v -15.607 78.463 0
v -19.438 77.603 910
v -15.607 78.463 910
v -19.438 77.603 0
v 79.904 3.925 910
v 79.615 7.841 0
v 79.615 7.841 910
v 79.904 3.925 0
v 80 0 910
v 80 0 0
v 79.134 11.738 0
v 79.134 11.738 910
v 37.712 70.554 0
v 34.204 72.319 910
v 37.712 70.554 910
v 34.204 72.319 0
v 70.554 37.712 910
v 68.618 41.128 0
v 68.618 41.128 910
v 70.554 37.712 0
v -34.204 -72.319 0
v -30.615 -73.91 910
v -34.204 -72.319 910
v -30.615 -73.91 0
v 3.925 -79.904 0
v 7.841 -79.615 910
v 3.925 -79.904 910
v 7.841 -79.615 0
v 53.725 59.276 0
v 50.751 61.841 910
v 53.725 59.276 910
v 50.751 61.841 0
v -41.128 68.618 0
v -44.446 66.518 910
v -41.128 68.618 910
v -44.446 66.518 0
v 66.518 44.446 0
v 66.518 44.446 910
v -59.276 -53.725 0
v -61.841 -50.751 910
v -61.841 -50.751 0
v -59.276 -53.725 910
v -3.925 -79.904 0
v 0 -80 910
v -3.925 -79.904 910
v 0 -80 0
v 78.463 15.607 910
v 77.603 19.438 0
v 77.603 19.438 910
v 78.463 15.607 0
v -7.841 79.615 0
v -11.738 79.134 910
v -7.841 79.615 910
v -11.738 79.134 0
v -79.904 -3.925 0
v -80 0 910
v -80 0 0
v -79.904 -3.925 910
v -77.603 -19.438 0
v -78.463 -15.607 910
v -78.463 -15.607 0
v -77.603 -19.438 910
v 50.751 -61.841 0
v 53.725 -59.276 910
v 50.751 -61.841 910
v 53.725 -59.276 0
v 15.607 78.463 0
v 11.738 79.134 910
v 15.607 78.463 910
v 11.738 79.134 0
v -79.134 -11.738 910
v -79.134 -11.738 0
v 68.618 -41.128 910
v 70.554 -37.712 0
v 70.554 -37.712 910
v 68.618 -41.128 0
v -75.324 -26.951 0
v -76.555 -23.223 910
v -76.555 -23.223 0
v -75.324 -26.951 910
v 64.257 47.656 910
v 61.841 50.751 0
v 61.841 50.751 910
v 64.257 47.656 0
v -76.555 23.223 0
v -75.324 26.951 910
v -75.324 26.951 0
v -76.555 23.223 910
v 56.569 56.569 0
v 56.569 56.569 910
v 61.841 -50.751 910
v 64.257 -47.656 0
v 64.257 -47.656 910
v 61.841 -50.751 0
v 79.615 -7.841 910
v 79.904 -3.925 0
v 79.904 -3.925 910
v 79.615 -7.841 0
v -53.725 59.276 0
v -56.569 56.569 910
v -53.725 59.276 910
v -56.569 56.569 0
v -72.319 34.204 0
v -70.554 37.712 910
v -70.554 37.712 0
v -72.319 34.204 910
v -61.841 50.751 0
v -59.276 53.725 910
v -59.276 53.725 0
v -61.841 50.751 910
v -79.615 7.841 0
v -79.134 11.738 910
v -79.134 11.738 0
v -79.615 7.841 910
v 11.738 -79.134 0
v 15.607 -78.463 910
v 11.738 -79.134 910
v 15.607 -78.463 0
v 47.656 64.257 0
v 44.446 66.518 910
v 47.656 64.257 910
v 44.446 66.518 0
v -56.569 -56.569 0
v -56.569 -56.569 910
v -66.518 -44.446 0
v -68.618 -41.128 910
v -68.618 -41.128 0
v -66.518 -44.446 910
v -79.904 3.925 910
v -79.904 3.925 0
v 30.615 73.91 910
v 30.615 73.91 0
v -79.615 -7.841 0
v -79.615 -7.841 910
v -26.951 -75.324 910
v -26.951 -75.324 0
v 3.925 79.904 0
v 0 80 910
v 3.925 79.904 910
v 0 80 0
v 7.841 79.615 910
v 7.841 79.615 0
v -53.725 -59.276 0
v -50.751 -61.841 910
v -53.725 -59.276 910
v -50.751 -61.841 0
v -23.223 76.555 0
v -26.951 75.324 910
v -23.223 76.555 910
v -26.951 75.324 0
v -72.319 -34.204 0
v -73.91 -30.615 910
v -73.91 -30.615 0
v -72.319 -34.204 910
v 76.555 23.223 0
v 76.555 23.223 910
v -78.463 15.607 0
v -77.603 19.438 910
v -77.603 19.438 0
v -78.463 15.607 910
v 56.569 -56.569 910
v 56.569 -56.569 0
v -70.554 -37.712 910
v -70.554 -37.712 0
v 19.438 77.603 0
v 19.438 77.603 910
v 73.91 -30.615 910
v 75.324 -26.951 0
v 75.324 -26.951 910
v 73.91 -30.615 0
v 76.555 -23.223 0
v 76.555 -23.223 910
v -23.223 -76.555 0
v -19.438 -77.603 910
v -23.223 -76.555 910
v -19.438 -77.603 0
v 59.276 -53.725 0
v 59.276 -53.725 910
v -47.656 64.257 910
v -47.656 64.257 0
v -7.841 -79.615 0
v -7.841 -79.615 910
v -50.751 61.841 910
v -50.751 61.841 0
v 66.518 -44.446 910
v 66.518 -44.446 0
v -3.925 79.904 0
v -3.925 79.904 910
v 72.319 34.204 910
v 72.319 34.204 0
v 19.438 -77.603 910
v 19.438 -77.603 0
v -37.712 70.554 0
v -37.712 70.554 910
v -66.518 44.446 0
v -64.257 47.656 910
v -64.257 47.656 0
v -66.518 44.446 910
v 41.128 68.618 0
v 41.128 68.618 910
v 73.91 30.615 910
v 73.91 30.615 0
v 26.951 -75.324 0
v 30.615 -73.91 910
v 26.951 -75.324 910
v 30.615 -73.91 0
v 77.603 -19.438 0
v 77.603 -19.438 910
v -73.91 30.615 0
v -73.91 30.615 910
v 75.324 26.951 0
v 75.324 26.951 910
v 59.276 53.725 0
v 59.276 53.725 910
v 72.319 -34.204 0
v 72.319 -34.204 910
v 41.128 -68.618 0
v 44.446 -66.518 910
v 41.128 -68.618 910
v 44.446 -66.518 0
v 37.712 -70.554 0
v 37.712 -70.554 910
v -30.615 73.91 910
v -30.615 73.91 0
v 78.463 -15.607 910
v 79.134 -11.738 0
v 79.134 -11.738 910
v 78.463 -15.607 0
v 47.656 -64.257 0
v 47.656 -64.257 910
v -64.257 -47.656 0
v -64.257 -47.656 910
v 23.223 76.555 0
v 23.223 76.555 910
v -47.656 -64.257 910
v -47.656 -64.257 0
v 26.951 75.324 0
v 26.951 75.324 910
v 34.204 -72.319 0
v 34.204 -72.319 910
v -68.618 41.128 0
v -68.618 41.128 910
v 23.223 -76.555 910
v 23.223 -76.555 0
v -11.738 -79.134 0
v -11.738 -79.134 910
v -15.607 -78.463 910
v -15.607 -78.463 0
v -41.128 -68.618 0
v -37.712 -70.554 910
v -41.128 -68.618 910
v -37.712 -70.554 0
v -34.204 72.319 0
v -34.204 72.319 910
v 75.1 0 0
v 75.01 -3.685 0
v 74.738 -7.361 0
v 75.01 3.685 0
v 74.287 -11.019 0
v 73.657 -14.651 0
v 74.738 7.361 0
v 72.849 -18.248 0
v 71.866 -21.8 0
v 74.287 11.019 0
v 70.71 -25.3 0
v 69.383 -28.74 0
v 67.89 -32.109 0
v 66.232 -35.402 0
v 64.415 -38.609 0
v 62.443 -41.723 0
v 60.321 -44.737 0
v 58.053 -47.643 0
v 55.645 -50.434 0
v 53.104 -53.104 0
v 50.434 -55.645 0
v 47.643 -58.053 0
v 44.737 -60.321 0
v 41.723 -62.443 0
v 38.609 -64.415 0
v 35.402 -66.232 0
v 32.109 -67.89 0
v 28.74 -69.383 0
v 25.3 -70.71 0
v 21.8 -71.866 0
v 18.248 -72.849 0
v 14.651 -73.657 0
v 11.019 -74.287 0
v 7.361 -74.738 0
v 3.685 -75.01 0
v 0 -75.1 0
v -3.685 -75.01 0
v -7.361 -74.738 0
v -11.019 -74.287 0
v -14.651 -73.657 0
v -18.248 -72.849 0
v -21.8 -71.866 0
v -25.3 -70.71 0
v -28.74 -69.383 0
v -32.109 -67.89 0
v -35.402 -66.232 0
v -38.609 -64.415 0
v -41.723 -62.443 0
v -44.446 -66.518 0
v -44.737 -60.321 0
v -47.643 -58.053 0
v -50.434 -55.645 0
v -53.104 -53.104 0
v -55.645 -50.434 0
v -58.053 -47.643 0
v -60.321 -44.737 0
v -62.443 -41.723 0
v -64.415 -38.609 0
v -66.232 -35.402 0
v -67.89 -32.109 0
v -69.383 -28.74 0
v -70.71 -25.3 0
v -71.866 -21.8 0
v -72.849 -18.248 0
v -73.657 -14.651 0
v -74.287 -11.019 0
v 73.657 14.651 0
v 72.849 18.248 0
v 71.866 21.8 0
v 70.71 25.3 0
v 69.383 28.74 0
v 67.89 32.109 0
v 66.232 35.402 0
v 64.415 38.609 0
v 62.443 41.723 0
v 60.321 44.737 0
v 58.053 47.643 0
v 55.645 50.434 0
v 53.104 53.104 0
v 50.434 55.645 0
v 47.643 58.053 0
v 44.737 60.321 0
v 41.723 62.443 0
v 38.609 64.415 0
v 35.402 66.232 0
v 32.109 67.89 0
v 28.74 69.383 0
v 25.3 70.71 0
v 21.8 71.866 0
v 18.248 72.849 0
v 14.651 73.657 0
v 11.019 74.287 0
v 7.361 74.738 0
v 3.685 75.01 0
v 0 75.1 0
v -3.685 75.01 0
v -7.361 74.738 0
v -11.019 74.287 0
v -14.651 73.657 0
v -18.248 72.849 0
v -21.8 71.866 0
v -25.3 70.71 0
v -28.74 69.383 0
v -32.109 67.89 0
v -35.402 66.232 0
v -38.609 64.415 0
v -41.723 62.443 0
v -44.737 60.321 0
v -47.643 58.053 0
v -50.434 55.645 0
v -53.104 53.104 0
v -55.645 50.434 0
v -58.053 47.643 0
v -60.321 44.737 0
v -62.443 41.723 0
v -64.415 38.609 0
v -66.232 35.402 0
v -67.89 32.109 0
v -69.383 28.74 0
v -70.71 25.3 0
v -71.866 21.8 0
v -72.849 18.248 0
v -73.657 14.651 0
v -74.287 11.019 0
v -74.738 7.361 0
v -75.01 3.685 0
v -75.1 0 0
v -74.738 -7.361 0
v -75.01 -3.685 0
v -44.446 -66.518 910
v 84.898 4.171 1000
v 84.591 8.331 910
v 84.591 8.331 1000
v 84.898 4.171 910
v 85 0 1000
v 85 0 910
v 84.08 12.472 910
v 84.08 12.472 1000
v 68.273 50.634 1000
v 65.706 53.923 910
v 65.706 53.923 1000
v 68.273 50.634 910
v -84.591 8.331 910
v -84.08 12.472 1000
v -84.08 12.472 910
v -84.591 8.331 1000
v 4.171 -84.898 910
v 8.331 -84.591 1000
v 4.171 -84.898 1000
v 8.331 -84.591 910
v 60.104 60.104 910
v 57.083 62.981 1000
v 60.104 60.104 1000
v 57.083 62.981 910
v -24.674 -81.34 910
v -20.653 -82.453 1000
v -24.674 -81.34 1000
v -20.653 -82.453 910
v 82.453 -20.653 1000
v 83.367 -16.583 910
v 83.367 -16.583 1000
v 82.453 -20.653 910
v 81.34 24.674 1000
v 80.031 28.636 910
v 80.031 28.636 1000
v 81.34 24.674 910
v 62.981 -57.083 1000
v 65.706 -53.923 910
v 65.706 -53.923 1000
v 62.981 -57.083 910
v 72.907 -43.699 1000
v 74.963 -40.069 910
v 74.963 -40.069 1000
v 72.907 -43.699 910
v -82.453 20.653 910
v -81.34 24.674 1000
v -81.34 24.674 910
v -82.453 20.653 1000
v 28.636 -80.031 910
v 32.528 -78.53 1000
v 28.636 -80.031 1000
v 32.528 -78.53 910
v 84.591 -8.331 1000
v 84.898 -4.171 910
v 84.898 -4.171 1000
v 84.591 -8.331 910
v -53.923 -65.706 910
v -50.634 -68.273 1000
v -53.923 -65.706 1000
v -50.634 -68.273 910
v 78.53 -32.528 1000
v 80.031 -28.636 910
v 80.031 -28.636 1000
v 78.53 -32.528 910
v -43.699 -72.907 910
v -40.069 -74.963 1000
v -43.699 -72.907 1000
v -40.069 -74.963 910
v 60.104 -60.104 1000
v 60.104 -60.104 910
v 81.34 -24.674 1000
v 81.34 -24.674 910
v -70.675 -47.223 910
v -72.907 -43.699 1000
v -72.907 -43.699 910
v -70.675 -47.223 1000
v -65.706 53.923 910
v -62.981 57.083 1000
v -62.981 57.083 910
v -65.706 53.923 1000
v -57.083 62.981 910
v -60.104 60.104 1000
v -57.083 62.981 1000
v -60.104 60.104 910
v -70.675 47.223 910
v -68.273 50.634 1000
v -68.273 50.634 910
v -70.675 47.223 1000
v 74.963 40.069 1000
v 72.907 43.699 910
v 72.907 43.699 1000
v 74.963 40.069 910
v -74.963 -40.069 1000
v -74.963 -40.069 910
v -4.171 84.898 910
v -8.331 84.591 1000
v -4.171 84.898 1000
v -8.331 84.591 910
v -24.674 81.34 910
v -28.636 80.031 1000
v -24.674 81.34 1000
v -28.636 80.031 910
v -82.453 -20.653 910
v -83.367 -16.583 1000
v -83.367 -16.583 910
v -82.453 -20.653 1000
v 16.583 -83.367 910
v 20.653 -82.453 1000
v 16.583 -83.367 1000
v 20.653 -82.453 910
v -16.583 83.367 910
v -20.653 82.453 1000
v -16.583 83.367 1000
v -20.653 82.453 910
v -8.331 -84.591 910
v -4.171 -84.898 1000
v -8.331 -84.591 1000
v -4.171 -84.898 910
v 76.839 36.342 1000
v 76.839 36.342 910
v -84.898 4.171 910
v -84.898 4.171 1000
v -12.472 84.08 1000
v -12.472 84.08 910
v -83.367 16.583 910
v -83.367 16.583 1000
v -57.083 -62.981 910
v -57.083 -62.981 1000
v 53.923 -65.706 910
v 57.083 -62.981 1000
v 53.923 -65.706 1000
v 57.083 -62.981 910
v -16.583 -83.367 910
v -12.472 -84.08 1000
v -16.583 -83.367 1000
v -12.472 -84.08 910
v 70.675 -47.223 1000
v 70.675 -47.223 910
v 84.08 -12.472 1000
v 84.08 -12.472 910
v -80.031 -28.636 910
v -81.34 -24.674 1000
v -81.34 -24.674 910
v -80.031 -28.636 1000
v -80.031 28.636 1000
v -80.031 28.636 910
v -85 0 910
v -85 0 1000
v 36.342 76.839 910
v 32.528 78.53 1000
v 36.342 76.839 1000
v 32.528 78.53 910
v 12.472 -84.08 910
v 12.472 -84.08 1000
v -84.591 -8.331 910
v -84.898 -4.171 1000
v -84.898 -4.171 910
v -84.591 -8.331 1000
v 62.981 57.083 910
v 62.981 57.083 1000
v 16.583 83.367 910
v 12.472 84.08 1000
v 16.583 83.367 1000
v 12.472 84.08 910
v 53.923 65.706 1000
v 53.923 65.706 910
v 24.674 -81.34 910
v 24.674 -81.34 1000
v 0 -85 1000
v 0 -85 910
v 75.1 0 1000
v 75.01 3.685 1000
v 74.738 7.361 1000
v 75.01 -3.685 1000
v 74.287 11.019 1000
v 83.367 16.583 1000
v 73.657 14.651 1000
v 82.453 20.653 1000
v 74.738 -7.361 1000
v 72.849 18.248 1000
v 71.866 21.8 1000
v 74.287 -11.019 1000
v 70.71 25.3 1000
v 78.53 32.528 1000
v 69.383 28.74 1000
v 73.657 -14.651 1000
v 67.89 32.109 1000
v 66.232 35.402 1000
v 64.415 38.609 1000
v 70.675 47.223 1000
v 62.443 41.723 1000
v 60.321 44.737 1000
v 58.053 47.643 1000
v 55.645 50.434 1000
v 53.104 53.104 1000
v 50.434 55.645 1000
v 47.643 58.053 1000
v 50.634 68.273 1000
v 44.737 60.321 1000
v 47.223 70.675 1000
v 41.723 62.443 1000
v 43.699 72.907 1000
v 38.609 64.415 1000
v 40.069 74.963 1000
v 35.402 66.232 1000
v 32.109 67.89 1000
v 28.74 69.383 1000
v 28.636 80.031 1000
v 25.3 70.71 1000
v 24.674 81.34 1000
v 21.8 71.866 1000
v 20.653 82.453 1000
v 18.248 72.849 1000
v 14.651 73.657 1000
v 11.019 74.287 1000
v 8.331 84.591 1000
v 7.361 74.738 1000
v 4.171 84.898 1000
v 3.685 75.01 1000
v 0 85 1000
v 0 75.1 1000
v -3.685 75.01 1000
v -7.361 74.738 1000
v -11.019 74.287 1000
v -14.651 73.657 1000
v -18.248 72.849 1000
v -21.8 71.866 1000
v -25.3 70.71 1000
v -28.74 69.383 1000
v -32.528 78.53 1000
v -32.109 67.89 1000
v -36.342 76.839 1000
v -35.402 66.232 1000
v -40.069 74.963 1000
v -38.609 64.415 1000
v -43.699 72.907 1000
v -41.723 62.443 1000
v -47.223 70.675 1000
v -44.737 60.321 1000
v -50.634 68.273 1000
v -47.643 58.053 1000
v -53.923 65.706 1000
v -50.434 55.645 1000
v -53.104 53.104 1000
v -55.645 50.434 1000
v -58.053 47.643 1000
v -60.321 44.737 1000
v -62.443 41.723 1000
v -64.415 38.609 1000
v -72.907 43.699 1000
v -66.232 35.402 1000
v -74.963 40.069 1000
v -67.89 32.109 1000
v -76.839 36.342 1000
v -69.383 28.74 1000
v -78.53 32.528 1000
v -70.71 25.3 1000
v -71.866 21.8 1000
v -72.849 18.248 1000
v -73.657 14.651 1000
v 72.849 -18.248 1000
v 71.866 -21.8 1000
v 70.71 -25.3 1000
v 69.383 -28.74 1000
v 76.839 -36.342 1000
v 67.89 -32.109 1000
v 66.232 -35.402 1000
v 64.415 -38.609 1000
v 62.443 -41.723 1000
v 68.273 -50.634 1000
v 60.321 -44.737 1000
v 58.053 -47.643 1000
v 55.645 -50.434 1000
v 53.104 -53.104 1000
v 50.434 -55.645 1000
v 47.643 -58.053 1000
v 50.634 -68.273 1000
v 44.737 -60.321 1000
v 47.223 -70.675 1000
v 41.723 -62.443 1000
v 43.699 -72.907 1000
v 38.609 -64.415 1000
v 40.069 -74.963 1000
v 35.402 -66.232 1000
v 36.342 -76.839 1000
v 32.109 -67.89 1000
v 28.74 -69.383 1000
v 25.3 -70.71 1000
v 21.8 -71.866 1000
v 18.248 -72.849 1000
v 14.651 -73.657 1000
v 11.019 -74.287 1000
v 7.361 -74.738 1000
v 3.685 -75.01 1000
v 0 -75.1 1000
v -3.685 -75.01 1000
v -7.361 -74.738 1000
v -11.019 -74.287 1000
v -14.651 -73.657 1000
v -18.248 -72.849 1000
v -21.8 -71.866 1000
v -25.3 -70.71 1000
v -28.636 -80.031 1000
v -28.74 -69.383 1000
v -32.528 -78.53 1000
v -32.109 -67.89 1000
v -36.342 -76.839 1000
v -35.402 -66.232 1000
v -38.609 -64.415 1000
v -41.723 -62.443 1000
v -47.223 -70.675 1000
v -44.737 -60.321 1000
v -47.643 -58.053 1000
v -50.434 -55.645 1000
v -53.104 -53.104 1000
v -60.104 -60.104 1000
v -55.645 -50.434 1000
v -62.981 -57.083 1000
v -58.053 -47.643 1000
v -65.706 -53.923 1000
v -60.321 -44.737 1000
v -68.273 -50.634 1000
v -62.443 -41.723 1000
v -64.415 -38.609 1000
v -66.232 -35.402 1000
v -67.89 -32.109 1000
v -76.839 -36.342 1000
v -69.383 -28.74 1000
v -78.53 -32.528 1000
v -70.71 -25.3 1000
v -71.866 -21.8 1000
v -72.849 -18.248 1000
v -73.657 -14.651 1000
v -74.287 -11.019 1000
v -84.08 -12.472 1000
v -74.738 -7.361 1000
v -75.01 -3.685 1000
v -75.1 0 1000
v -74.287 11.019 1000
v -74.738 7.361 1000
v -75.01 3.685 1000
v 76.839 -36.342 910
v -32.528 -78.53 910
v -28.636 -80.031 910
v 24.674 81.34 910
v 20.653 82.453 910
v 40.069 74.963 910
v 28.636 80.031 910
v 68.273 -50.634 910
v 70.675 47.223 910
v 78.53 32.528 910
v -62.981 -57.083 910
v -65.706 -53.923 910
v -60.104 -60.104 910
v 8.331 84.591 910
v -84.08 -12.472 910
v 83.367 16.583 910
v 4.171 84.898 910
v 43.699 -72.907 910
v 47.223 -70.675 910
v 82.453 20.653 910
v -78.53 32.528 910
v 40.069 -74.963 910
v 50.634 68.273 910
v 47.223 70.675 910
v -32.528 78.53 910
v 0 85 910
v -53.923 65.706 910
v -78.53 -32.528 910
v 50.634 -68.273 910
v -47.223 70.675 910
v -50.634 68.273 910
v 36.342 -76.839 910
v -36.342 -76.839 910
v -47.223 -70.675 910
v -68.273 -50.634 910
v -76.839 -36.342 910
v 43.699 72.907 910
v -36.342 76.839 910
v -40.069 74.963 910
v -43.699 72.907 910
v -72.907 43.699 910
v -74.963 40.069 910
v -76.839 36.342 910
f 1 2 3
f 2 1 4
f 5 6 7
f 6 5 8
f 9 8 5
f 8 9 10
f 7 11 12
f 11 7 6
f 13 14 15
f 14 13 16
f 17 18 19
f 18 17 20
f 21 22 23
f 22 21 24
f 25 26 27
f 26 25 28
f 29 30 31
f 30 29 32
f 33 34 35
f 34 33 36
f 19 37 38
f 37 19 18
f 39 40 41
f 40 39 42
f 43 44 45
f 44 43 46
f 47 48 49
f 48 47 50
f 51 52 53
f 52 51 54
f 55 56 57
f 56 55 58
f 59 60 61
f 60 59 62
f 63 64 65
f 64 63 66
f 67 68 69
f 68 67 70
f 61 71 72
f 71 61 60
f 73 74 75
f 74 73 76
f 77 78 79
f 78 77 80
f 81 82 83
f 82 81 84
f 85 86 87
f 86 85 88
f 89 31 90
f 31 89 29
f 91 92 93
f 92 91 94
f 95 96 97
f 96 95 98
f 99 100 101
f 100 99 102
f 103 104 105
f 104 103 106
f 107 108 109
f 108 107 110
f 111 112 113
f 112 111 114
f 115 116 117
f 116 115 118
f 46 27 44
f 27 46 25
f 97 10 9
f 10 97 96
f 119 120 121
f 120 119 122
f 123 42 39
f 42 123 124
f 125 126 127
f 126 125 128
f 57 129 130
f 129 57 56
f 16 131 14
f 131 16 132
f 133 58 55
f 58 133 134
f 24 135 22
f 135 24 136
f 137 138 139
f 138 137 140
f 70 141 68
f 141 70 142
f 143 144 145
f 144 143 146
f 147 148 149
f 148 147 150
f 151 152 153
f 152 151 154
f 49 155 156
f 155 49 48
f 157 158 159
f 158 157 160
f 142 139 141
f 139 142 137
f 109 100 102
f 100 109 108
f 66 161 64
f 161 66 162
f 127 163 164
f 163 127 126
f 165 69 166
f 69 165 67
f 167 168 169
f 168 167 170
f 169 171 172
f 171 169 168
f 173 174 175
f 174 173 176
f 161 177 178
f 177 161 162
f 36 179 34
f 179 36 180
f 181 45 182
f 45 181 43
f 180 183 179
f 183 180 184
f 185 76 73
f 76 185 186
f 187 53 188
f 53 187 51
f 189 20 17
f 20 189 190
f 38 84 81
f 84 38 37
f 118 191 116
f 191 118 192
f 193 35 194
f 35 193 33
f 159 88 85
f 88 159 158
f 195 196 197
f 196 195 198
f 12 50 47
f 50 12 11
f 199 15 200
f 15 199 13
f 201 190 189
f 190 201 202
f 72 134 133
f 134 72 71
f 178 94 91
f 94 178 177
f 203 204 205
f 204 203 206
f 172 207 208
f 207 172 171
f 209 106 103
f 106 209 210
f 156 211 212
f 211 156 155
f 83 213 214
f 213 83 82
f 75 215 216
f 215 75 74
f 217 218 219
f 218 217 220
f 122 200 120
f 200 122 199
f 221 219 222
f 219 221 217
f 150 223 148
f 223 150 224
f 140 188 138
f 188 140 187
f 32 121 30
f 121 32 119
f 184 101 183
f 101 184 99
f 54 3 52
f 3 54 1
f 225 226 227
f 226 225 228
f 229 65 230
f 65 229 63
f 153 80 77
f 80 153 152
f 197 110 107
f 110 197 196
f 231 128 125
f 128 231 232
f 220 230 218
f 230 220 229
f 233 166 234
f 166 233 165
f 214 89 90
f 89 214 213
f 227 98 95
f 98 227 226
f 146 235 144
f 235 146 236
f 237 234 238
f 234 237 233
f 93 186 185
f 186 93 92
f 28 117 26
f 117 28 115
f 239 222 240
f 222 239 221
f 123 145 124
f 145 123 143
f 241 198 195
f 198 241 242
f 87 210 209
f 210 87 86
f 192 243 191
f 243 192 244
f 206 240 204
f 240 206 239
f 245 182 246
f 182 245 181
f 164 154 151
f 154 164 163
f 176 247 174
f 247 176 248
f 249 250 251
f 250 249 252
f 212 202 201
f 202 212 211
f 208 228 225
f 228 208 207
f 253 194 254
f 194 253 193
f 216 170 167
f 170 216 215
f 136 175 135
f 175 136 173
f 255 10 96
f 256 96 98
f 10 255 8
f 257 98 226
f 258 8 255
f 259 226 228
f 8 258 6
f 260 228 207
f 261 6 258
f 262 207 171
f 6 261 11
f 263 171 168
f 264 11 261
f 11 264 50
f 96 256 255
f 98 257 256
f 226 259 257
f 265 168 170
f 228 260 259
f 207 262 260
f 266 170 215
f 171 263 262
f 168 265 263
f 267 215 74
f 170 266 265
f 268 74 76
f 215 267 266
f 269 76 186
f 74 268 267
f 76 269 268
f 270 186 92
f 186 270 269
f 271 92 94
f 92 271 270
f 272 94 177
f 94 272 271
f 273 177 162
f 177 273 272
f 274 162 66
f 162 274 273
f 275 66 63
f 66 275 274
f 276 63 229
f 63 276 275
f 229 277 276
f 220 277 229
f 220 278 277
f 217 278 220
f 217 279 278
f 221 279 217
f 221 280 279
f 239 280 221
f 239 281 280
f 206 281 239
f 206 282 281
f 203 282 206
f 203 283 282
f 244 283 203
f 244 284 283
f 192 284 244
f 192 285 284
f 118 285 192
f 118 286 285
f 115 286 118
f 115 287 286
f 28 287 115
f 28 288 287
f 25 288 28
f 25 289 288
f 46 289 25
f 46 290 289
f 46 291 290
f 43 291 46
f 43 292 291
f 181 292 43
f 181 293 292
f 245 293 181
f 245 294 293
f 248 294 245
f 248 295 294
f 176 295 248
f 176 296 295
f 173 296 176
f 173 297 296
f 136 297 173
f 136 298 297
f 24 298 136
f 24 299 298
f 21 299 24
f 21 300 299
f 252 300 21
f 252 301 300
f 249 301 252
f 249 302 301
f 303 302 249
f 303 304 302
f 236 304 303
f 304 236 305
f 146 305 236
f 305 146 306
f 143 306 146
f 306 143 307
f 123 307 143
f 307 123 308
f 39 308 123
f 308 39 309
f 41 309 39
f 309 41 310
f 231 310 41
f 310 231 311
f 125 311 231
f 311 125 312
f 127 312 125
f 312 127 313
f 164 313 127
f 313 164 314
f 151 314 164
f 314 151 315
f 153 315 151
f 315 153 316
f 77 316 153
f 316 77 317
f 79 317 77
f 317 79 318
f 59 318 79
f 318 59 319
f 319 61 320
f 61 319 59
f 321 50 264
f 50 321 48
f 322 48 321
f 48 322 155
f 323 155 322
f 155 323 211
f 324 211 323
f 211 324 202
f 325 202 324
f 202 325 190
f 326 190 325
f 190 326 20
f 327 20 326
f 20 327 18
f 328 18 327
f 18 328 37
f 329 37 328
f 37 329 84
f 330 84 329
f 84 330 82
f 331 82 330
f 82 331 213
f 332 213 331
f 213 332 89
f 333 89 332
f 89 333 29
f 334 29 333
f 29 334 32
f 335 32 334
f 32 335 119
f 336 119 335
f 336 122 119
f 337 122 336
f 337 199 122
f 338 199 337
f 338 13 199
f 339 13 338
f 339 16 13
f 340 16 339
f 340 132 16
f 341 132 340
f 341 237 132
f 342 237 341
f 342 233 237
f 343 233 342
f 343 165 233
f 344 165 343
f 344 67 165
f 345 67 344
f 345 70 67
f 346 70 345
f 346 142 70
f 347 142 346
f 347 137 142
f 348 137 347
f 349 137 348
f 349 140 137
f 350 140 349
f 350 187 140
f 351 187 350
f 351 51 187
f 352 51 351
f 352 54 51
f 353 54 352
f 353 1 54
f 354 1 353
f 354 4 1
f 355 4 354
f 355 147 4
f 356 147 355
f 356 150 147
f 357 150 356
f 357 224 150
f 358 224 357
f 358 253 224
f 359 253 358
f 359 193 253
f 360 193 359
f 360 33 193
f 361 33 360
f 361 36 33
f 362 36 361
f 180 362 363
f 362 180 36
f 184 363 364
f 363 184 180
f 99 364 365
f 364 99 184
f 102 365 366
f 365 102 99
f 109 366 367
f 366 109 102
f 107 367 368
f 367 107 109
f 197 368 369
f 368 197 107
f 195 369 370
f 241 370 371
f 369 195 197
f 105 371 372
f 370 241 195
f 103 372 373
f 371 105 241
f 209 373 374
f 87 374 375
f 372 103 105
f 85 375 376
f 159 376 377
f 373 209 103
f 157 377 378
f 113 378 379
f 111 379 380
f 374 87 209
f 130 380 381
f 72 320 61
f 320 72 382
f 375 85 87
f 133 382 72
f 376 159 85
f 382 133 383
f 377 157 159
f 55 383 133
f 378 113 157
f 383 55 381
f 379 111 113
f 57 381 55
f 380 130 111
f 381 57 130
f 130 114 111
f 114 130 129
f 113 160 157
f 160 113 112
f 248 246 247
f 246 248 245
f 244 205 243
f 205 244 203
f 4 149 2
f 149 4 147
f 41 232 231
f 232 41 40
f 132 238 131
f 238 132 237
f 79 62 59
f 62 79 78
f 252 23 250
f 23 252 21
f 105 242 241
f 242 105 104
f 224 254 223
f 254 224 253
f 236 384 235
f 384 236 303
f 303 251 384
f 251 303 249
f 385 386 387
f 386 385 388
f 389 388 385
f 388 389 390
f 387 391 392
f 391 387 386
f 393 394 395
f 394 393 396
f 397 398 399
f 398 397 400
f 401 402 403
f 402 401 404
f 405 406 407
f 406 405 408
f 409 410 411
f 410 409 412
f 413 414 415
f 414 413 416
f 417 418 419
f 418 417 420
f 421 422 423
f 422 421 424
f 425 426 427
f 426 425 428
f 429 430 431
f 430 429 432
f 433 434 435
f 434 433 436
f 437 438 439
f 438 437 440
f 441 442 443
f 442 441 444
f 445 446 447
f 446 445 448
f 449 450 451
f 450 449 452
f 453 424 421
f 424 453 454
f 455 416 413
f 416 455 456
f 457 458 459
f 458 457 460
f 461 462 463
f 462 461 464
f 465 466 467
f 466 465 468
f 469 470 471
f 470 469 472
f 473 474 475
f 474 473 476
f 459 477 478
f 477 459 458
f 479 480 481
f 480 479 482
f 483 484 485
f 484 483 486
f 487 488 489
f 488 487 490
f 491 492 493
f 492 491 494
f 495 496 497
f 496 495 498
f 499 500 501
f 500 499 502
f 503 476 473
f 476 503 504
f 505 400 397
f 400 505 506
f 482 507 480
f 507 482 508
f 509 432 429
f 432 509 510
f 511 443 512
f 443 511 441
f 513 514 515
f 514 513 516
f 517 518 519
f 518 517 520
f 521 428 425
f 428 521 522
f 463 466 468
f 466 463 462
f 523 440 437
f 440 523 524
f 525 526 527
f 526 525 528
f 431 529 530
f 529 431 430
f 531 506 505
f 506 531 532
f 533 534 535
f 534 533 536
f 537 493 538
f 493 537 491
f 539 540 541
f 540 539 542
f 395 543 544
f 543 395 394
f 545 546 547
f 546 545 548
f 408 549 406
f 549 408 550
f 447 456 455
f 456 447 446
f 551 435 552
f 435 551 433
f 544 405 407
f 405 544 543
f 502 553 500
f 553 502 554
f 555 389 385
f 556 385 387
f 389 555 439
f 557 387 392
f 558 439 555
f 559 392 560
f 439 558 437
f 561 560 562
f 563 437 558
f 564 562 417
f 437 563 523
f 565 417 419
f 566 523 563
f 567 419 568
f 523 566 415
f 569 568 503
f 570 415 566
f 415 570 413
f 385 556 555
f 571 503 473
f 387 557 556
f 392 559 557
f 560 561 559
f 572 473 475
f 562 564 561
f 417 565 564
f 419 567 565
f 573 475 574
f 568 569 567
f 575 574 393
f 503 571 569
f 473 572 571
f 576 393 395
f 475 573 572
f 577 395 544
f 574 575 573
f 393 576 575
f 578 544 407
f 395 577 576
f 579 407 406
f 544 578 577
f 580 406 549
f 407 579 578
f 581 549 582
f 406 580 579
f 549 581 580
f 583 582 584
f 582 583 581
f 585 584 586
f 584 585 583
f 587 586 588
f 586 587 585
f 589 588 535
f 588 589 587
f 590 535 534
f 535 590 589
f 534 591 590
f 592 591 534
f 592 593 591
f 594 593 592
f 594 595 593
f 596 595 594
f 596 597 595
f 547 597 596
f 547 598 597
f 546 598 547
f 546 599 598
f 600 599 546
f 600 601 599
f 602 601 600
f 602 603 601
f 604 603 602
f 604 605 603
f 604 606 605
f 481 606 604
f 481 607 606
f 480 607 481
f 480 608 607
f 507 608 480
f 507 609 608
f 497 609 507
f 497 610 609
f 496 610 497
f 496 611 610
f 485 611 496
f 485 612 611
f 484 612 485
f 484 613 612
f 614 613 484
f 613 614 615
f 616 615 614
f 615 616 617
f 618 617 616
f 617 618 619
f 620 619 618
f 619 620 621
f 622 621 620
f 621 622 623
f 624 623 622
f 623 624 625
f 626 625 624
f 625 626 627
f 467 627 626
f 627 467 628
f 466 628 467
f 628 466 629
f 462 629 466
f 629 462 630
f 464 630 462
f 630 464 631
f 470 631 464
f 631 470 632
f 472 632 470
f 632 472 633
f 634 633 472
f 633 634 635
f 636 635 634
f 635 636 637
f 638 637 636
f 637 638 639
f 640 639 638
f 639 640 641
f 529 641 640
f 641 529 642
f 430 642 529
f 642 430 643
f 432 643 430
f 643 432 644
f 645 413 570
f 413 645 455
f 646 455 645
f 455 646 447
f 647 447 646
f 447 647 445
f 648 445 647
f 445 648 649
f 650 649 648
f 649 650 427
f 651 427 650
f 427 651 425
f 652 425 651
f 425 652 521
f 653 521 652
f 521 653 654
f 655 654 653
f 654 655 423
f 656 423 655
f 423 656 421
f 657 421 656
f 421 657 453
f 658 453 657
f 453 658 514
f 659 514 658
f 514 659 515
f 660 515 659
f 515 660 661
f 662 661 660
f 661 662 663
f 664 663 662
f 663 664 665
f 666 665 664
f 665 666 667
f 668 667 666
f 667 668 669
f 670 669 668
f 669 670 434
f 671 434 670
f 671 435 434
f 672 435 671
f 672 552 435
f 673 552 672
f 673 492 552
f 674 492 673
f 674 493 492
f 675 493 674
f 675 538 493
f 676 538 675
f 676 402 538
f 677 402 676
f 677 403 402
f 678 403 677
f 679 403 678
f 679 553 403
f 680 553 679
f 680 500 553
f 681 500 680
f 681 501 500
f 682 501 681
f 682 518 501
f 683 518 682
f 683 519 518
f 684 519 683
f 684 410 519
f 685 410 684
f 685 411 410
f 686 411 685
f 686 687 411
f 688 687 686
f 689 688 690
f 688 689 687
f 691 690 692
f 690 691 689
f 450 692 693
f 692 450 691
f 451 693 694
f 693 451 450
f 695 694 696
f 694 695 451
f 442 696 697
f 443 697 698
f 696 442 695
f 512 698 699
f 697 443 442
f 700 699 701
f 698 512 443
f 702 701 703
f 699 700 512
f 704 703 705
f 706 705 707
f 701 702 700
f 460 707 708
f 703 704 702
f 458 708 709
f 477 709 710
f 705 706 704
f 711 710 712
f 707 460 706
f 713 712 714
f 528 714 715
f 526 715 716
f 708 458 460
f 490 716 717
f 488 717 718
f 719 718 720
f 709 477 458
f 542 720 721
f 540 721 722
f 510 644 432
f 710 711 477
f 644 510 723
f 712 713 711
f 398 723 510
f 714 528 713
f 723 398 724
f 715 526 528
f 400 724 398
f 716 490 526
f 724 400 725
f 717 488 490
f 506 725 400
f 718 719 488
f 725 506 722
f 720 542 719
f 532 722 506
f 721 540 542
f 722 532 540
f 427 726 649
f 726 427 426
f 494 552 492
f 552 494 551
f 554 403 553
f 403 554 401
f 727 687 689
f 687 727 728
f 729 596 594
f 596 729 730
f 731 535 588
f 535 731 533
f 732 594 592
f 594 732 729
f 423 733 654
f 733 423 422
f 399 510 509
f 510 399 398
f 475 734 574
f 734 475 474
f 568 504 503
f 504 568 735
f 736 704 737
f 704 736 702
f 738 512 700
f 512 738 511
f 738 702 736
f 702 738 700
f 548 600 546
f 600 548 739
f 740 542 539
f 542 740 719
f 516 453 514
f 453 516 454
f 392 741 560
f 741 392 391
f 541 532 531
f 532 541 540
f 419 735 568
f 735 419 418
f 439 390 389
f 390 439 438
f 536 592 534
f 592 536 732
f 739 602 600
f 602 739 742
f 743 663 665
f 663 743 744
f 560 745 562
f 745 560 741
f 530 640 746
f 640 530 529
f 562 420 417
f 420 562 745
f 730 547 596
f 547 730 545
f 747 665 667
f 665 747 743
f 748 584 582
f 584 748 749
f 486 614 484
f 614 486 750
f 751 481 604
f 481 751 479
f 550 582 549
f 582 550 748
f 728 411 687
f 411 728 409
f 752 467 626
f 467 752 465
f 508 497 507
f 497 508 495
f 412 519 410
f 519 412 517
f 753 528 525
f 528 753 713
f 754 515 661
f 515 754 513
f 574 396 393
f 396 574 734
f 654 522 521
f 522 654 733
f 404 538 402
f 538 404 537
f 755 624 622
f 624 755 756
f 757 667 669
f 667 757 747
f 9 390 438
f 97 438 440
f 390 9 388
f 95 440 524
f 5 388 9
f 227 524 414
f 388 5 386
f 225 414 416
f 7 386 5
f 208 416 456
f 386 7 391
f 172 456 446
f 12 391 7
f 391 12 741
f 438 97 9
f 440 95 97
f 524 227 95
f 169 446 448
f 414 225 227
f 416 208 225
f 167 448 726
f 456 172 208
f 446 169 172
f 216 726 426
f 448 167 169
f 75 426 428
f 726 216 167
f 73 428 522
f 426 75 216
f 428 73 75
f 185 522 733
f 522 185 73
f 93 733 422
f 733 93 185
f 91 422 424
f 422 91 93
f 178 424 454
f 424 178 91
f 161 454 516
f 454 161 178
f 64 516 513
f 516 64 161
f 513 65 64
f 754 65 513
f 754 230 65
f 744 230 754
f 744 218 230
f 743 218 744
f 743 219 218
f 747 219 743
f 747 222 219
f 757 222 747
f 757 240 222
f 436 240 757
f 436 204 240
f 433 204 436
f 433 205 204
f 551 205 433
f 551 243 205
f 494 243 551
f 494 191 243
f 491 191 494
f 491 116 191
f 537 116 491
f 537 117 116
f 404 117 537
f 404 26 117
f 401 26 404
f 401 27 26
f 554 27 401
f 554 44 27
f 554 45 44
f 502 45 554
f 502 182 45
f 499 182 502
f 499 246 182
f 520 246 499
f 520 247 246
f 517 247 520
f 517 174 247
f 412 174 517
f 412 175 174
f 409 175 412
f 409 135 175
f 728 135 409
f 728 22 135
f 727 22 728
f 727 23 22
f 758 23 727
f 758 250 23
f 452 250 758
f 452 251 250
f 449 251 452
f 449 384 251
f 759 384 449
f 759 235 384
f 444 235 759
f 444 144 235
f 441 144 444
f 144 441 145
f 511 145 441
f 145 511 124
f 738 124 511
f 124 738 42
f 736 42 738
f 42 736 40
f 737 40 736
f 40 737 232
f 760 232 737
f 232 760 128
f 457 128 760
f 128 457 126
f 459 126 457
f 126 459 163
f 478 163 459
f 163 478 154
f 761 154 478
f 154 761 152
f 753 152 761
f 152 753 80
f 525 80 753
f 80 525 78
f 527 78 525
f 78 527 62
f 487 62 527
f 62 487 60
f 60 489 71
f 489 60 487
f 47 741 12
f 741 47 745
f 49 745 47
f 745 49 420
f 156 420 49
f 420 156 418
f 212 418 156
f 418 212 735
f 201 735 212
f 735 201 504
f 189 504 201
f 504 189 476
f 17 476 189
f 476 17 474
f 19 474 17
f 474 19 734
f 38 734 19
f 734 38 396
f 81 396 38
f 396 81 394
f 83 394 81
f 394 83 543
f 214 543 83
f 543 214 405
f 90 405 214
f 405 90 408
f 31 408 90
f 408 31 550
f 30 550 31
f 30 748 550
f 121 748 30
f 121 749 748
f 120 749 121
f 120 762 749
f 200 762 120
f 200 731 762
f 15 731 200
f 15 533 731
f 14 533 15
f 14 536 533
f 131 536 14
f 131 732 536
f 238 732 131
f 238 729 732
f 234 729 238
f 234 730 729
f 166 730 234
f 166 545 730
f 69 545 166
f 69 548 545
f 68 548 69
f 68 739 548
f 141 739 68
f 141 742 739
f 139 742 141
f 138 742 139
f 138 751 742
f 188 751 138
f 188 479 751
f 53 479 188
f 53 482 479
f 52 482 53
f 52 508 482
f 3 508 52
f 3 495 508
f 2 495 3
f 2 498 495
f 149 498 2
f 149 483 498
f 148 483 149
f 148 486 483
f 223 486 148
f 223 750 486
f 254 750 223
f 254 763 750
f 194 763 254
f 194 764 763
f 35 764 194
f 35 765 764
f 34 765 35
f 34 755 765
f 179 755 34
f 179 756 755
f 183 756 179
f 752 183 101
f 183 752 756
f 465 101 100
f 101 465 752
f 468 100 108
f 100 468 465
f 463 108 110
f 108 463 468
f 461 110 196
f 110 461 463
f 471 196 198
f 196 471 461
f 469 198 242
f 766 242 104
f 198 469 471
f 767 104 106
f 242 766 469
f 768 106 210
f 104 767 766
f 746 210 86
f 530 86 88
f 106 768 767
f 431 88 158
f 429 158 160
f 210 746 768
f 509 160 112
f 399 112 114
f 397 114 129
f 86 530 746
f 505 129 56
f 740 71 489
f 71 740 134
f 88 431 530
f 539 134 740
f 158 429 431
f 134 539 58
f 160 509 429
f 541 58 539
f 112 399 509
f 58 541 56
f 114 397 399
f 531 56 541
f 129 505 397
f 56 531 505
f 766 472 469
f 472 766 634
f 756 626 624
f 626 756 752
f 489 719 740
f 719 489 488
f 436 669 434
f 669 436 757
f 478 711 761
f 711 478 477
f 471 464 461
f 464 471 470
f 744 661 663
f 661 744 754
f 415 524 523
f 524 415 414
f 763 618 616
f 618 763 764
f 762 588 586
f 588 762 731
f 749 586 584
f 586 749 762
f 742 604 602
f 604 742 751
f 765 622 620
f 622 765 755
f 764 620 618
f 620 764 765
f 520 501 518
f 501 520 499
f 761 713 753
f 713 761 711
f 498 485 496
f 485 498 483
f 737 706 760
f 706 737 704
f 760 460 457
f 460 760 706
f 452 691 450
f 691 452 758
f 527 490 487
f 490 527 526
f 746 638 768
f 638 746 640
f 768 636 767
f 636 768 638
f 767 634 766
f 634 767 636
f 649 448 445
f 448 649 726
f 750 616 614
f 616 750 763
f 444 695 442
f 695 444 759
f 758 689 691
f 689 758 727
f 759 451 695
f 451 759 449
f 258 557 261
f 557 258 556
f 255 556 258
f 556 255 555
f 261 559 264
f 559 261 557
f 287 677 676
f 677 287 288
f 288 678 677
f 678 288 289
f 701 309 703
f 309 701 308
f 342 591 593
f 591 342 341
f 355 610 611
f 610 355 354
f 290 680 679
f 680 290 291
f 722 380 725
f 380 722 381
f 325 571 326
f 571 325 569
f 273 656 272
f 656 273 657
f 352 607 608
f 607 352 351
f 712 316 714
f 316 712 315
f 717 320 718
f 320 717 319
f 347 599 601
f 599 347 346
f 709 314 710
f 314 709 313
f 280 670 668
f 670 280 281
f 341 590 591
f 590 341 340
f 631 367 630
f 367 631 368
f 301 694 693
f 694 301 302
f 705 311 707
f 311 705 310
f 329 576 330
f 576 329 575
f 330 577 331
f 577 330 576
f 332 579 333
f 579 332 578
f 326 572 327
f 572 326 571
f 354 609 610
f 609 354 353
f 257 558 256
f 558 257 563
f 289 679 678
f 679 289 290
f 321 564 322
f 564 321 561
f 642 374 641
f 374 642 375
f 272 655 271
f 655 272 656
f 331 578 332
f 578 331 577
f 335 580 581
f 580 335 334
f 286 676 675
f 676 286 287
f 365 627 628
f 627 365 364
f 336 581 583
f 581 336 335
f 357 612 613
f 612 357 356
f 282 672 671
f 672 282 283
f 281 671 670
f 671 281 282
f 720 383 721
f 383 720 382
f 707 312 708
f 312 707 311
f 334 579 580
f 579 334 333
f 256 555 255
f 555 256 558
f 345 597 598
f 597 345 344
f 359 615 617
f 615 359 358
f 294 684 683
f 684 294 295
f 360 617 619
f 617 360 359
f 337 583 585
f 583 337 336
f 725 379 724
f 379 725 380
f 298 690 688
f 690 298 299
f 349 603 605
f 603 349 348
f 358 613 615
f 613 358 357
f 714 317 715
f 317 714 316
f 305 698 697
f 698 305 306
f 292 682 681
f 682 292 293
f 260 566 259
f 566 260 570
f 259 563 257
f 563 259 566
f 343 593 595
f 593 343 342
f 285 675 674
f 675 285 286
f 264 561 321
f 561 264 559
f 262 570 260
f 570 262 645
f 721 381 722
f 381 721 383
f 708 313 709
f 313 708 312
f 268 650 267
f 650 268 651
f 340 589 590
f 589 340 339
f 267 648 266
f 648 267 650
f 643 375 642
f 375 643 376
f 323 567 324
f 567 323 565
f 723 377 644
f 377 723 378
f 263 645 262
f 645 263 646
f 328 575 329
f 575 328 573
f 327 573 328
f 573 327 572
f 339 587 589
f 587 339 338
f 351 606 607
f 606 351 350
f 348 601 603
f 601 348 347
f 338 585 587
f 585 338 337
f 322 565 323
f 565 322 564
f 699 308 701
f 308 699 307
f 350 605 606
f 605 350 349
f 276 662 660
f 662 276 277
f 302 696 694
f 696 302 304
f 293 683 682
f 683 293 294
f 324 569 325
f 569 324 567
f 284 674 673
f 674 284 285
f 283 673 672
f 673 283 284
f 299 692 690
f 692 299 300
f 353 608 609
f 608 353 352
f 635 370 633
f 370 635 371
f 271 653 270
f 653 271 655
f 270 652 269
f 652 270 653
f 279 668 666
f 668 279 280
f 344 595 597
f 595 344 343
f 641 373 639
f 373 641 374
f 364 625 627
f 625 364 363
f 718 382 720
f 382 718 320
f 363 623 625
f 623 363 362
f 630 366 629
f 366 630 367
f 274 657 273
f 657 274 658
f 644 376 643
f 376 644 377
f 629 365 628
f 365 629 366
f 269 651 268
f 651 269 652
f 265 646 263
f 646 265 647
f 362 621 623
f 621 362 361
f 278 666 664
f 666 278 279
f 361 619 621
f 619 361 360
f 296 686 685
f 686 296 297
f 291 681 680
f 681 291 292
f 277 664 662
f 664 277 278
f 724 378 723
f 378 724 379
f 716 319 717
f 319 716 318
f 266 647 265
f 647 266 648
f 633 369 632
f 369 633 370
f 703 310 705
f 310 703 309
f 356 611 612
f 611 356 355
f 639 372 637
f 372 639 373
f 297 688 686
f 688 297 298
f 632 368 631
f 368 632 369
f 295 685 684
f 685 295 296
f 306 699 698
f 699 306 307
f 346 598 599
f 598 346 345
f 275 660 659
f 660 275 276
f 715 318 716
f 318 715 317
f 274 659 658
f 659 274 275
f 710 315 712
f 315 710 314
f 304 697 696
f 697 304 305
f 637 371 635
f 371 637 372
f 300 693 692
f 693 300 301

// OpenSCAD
// HT 160 pipe 1000 mm (single connected solid)

// Parameters
pipe_standard = 1; //[1:1:1]
nominal_diameter_mm = 160; //[80:320:1]
length_mm = 1000; //[500:2000:1]
include_fitting = 1; //[0:1:1]
fitting_end = 1; //[1:1:1]
pipe_od_mm = 160; //[80:320:1]
pipe_wall_mm = 4.9; //[2.5:10:0.1]
fitting_length_mm = 90; //[45:180:1]
fitting_od_extra_mm = 10; //[5:20:1]
overlap_mm = 1; //[0.5:2:0.1]
pipe_body_length_mm = 910; //[410:1910:1]

$fn = 128;

// Derived
pipe_r  = pipe_od_mm/2;
pipe_ir = max(0.01, pipe_r - pipe_wall_mm);
fitting_r = pipe_r + fitting_od_extra_mm/2;

// Lengths (ensure total equals length_mm)
body_len  = (include_fitting ? max(0.01, length_mm - fitting_length_mm + overlap_mm) : length_mm);
total_len = (include_fitting ? body_len + fitting_length_mm - overlap_mm : body_len);

// HT Pipe - one connected solid
module ht_pipe() {
  color([0.85, 0.85, 0.8])
  difference() {
    // OUTER solid (body + optional fitting, overlapped for guaranteed connectivity)
    union() {
      cylinder(h=body_len, r=pipe_r, center=false);

      if (include_fitting) {
        translate([0, 0, body_len - overlap_mm])
          cylinder(h=fitting_length_mm, r=fitting_r, center=false);
      }
    }

    // INNER void (open through both ends; no arbitrary offsets)
    translate([0, 0, -0.01])
      cylinder(h=total_len + 0.02, r=pipe_ir, center=false);
  }
}

ht_pipe();
